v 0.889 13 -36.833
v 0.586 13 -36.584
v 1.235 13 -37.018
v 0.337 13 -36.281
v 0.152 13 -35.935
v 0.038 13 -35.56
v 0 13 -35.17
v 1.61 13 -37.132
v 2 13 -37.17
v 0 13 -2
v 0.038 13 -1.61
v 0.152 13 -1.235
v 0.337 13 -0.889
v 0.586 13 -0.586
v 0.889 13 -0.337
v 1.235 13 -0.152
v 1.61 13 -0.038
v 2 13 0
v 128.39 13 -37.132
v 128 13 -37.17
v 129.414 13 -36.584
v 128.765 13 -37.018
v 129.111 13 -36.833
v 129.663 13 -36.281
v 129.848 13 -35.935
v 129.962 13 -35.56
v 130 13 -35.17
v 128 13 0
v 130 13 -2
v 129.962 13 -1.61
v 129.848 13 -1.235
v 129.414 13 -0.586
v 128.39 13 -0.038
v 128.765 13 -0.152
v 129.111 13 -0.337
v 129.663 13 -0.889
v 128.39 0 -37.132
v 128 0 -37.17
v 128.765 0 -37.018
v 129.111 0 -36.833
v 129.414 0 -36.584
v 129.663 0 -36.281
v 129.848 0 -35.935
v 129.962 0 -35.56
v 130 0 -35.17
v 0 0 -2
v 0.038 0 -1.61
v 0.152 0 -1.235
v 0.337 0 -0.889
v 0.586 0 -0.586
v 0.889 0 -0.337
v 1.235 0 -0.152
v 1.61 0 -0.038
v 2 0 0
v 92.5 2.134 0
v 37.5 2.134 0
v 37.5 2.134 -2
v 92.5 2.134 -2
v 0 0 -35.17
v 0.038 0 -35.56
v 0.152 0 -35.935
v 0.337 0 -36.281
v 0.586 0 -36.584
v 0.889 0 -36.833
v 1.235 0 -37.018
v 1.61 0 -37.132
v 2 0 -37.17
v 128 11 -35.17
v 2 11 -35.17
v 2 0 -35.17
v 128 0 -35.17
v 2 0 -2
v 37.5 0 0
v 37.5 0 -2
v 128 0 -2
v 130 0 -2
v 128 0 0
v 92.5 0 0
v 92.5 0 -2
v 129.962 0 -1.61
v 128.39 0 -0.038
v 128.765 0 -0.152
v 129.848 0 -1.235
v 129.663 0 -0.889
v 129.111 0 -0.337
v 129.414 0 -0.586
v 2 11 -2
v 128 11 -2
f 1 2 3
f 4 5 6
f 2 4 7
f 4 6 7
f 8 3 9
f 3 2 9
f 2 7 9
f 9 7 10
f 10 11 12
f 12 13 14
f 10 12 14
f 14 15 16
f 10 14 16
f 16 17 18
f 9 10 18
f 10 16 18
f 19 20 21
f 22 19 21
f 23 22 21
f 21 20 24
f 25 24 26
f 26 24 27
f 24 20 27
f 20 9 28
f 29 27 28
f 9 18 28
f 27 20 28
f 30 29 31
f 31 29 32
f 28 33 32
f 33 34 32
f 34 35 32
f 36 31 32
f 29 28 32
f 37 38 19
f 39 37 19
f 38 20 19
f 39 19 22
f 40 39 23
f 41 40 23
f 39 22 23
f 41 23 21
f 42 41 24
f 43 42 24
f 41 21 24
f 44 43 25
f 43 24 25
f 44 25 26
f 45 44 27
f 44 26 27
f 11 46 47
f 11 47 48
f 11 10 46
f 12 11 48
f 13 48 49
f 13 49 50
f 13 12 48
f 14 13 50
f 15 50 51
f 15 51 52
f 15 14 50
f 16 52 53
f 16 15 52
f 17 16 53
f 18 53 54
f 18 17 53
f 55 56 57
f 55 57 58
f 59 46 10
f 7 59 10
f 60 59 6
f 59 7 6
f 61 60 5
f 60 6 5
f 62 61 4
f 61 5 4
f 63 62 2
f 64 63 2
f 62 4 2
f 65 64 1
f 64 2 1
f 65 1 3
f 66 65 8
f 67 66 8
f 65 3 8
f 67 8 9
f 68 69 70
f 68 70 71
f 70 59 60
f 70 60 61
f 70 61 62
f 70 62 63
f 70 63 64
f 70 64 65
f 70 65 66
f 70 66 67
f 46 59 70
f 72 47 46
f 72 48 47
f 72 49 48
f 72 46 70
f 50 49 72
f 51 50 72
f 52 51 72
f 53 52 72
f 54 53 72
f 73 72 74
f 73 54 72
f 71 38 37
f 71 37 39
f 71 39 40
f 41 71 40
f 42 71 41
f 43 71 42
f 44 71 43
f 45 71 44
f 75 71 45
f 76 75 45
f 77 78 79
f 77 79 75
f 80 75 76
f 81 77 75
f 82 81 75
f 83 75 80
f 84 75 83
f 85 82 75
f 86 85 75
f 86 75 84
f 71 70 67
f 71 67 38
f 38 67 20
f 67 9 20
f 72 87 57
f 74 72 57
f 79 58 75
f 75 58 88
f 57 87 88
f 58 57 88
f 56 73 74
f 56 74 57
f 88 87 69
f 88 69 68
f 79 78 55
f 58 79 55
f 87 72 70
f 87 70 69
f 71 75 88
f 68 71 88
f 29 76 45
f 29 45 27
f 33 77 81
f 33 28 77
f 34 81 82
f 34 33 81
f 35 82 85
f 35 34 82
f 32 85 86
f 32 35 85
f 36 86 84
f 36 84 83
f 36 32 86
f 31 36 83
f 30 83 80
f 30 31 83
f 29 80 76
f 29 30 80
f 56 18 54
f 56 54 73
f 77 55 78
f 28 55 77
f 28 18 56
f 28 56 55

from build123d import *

# Parameters (mm, degrees)
SKETCH1_W           = 130
SKETCH1_H           = 13
BOSS_EXTRUDE1_DEPTH = 37.17
SHELL1_T            = -2
SKETCH2_W           = 55
SKETCH2_H           = 2.13378228
CUT_EXTRUDE1_DEPTH  = 5
FILLET1_R           = 2


with BuildPart() as part:
    # Sketch1 → Boss-Extrude1 (new body)
    with BuildSketch(Plane.XY):
        with Locations((65, 6.5)):
            Rectangle(SKETCH1_W, SKETCH1_H)
    extrude(amount=-BOSS_EXTRUDE1_DEPTH)

    # Shell1
    shell1_openings = [part.faces().sort_by_distance(p)[0] for p in [
        (65, 0, -18.585),
    ]]
    offset(amount=SHELL1_T, openings=shell1_openings, kind=Kind.INTERSECTION)

    # Sketch2 → Cut-Extrude1 (cut)
    with BuildSketch(Plane.XY):
        with Locations((65, 1.06689114)):
            Rectangle(SKETCH2_W, SKETCH2_H)
    extrude(amount=-CUT_EXTRUDE1_DEPTH, mode=Mode.SUBTRACT)

    # Fillet1
    fillet1_edges = [part.edges().sort_by_distance(p)[0] for p in [
        (130, 6.5, -37.17),
        (0, 6.5, -37.17),
        (130, 6.5, 0),
        (0, 6.5, 0),
    ]]
    fillet(fillet1_edges, radius=FILLET1_R)


solid = part.part
